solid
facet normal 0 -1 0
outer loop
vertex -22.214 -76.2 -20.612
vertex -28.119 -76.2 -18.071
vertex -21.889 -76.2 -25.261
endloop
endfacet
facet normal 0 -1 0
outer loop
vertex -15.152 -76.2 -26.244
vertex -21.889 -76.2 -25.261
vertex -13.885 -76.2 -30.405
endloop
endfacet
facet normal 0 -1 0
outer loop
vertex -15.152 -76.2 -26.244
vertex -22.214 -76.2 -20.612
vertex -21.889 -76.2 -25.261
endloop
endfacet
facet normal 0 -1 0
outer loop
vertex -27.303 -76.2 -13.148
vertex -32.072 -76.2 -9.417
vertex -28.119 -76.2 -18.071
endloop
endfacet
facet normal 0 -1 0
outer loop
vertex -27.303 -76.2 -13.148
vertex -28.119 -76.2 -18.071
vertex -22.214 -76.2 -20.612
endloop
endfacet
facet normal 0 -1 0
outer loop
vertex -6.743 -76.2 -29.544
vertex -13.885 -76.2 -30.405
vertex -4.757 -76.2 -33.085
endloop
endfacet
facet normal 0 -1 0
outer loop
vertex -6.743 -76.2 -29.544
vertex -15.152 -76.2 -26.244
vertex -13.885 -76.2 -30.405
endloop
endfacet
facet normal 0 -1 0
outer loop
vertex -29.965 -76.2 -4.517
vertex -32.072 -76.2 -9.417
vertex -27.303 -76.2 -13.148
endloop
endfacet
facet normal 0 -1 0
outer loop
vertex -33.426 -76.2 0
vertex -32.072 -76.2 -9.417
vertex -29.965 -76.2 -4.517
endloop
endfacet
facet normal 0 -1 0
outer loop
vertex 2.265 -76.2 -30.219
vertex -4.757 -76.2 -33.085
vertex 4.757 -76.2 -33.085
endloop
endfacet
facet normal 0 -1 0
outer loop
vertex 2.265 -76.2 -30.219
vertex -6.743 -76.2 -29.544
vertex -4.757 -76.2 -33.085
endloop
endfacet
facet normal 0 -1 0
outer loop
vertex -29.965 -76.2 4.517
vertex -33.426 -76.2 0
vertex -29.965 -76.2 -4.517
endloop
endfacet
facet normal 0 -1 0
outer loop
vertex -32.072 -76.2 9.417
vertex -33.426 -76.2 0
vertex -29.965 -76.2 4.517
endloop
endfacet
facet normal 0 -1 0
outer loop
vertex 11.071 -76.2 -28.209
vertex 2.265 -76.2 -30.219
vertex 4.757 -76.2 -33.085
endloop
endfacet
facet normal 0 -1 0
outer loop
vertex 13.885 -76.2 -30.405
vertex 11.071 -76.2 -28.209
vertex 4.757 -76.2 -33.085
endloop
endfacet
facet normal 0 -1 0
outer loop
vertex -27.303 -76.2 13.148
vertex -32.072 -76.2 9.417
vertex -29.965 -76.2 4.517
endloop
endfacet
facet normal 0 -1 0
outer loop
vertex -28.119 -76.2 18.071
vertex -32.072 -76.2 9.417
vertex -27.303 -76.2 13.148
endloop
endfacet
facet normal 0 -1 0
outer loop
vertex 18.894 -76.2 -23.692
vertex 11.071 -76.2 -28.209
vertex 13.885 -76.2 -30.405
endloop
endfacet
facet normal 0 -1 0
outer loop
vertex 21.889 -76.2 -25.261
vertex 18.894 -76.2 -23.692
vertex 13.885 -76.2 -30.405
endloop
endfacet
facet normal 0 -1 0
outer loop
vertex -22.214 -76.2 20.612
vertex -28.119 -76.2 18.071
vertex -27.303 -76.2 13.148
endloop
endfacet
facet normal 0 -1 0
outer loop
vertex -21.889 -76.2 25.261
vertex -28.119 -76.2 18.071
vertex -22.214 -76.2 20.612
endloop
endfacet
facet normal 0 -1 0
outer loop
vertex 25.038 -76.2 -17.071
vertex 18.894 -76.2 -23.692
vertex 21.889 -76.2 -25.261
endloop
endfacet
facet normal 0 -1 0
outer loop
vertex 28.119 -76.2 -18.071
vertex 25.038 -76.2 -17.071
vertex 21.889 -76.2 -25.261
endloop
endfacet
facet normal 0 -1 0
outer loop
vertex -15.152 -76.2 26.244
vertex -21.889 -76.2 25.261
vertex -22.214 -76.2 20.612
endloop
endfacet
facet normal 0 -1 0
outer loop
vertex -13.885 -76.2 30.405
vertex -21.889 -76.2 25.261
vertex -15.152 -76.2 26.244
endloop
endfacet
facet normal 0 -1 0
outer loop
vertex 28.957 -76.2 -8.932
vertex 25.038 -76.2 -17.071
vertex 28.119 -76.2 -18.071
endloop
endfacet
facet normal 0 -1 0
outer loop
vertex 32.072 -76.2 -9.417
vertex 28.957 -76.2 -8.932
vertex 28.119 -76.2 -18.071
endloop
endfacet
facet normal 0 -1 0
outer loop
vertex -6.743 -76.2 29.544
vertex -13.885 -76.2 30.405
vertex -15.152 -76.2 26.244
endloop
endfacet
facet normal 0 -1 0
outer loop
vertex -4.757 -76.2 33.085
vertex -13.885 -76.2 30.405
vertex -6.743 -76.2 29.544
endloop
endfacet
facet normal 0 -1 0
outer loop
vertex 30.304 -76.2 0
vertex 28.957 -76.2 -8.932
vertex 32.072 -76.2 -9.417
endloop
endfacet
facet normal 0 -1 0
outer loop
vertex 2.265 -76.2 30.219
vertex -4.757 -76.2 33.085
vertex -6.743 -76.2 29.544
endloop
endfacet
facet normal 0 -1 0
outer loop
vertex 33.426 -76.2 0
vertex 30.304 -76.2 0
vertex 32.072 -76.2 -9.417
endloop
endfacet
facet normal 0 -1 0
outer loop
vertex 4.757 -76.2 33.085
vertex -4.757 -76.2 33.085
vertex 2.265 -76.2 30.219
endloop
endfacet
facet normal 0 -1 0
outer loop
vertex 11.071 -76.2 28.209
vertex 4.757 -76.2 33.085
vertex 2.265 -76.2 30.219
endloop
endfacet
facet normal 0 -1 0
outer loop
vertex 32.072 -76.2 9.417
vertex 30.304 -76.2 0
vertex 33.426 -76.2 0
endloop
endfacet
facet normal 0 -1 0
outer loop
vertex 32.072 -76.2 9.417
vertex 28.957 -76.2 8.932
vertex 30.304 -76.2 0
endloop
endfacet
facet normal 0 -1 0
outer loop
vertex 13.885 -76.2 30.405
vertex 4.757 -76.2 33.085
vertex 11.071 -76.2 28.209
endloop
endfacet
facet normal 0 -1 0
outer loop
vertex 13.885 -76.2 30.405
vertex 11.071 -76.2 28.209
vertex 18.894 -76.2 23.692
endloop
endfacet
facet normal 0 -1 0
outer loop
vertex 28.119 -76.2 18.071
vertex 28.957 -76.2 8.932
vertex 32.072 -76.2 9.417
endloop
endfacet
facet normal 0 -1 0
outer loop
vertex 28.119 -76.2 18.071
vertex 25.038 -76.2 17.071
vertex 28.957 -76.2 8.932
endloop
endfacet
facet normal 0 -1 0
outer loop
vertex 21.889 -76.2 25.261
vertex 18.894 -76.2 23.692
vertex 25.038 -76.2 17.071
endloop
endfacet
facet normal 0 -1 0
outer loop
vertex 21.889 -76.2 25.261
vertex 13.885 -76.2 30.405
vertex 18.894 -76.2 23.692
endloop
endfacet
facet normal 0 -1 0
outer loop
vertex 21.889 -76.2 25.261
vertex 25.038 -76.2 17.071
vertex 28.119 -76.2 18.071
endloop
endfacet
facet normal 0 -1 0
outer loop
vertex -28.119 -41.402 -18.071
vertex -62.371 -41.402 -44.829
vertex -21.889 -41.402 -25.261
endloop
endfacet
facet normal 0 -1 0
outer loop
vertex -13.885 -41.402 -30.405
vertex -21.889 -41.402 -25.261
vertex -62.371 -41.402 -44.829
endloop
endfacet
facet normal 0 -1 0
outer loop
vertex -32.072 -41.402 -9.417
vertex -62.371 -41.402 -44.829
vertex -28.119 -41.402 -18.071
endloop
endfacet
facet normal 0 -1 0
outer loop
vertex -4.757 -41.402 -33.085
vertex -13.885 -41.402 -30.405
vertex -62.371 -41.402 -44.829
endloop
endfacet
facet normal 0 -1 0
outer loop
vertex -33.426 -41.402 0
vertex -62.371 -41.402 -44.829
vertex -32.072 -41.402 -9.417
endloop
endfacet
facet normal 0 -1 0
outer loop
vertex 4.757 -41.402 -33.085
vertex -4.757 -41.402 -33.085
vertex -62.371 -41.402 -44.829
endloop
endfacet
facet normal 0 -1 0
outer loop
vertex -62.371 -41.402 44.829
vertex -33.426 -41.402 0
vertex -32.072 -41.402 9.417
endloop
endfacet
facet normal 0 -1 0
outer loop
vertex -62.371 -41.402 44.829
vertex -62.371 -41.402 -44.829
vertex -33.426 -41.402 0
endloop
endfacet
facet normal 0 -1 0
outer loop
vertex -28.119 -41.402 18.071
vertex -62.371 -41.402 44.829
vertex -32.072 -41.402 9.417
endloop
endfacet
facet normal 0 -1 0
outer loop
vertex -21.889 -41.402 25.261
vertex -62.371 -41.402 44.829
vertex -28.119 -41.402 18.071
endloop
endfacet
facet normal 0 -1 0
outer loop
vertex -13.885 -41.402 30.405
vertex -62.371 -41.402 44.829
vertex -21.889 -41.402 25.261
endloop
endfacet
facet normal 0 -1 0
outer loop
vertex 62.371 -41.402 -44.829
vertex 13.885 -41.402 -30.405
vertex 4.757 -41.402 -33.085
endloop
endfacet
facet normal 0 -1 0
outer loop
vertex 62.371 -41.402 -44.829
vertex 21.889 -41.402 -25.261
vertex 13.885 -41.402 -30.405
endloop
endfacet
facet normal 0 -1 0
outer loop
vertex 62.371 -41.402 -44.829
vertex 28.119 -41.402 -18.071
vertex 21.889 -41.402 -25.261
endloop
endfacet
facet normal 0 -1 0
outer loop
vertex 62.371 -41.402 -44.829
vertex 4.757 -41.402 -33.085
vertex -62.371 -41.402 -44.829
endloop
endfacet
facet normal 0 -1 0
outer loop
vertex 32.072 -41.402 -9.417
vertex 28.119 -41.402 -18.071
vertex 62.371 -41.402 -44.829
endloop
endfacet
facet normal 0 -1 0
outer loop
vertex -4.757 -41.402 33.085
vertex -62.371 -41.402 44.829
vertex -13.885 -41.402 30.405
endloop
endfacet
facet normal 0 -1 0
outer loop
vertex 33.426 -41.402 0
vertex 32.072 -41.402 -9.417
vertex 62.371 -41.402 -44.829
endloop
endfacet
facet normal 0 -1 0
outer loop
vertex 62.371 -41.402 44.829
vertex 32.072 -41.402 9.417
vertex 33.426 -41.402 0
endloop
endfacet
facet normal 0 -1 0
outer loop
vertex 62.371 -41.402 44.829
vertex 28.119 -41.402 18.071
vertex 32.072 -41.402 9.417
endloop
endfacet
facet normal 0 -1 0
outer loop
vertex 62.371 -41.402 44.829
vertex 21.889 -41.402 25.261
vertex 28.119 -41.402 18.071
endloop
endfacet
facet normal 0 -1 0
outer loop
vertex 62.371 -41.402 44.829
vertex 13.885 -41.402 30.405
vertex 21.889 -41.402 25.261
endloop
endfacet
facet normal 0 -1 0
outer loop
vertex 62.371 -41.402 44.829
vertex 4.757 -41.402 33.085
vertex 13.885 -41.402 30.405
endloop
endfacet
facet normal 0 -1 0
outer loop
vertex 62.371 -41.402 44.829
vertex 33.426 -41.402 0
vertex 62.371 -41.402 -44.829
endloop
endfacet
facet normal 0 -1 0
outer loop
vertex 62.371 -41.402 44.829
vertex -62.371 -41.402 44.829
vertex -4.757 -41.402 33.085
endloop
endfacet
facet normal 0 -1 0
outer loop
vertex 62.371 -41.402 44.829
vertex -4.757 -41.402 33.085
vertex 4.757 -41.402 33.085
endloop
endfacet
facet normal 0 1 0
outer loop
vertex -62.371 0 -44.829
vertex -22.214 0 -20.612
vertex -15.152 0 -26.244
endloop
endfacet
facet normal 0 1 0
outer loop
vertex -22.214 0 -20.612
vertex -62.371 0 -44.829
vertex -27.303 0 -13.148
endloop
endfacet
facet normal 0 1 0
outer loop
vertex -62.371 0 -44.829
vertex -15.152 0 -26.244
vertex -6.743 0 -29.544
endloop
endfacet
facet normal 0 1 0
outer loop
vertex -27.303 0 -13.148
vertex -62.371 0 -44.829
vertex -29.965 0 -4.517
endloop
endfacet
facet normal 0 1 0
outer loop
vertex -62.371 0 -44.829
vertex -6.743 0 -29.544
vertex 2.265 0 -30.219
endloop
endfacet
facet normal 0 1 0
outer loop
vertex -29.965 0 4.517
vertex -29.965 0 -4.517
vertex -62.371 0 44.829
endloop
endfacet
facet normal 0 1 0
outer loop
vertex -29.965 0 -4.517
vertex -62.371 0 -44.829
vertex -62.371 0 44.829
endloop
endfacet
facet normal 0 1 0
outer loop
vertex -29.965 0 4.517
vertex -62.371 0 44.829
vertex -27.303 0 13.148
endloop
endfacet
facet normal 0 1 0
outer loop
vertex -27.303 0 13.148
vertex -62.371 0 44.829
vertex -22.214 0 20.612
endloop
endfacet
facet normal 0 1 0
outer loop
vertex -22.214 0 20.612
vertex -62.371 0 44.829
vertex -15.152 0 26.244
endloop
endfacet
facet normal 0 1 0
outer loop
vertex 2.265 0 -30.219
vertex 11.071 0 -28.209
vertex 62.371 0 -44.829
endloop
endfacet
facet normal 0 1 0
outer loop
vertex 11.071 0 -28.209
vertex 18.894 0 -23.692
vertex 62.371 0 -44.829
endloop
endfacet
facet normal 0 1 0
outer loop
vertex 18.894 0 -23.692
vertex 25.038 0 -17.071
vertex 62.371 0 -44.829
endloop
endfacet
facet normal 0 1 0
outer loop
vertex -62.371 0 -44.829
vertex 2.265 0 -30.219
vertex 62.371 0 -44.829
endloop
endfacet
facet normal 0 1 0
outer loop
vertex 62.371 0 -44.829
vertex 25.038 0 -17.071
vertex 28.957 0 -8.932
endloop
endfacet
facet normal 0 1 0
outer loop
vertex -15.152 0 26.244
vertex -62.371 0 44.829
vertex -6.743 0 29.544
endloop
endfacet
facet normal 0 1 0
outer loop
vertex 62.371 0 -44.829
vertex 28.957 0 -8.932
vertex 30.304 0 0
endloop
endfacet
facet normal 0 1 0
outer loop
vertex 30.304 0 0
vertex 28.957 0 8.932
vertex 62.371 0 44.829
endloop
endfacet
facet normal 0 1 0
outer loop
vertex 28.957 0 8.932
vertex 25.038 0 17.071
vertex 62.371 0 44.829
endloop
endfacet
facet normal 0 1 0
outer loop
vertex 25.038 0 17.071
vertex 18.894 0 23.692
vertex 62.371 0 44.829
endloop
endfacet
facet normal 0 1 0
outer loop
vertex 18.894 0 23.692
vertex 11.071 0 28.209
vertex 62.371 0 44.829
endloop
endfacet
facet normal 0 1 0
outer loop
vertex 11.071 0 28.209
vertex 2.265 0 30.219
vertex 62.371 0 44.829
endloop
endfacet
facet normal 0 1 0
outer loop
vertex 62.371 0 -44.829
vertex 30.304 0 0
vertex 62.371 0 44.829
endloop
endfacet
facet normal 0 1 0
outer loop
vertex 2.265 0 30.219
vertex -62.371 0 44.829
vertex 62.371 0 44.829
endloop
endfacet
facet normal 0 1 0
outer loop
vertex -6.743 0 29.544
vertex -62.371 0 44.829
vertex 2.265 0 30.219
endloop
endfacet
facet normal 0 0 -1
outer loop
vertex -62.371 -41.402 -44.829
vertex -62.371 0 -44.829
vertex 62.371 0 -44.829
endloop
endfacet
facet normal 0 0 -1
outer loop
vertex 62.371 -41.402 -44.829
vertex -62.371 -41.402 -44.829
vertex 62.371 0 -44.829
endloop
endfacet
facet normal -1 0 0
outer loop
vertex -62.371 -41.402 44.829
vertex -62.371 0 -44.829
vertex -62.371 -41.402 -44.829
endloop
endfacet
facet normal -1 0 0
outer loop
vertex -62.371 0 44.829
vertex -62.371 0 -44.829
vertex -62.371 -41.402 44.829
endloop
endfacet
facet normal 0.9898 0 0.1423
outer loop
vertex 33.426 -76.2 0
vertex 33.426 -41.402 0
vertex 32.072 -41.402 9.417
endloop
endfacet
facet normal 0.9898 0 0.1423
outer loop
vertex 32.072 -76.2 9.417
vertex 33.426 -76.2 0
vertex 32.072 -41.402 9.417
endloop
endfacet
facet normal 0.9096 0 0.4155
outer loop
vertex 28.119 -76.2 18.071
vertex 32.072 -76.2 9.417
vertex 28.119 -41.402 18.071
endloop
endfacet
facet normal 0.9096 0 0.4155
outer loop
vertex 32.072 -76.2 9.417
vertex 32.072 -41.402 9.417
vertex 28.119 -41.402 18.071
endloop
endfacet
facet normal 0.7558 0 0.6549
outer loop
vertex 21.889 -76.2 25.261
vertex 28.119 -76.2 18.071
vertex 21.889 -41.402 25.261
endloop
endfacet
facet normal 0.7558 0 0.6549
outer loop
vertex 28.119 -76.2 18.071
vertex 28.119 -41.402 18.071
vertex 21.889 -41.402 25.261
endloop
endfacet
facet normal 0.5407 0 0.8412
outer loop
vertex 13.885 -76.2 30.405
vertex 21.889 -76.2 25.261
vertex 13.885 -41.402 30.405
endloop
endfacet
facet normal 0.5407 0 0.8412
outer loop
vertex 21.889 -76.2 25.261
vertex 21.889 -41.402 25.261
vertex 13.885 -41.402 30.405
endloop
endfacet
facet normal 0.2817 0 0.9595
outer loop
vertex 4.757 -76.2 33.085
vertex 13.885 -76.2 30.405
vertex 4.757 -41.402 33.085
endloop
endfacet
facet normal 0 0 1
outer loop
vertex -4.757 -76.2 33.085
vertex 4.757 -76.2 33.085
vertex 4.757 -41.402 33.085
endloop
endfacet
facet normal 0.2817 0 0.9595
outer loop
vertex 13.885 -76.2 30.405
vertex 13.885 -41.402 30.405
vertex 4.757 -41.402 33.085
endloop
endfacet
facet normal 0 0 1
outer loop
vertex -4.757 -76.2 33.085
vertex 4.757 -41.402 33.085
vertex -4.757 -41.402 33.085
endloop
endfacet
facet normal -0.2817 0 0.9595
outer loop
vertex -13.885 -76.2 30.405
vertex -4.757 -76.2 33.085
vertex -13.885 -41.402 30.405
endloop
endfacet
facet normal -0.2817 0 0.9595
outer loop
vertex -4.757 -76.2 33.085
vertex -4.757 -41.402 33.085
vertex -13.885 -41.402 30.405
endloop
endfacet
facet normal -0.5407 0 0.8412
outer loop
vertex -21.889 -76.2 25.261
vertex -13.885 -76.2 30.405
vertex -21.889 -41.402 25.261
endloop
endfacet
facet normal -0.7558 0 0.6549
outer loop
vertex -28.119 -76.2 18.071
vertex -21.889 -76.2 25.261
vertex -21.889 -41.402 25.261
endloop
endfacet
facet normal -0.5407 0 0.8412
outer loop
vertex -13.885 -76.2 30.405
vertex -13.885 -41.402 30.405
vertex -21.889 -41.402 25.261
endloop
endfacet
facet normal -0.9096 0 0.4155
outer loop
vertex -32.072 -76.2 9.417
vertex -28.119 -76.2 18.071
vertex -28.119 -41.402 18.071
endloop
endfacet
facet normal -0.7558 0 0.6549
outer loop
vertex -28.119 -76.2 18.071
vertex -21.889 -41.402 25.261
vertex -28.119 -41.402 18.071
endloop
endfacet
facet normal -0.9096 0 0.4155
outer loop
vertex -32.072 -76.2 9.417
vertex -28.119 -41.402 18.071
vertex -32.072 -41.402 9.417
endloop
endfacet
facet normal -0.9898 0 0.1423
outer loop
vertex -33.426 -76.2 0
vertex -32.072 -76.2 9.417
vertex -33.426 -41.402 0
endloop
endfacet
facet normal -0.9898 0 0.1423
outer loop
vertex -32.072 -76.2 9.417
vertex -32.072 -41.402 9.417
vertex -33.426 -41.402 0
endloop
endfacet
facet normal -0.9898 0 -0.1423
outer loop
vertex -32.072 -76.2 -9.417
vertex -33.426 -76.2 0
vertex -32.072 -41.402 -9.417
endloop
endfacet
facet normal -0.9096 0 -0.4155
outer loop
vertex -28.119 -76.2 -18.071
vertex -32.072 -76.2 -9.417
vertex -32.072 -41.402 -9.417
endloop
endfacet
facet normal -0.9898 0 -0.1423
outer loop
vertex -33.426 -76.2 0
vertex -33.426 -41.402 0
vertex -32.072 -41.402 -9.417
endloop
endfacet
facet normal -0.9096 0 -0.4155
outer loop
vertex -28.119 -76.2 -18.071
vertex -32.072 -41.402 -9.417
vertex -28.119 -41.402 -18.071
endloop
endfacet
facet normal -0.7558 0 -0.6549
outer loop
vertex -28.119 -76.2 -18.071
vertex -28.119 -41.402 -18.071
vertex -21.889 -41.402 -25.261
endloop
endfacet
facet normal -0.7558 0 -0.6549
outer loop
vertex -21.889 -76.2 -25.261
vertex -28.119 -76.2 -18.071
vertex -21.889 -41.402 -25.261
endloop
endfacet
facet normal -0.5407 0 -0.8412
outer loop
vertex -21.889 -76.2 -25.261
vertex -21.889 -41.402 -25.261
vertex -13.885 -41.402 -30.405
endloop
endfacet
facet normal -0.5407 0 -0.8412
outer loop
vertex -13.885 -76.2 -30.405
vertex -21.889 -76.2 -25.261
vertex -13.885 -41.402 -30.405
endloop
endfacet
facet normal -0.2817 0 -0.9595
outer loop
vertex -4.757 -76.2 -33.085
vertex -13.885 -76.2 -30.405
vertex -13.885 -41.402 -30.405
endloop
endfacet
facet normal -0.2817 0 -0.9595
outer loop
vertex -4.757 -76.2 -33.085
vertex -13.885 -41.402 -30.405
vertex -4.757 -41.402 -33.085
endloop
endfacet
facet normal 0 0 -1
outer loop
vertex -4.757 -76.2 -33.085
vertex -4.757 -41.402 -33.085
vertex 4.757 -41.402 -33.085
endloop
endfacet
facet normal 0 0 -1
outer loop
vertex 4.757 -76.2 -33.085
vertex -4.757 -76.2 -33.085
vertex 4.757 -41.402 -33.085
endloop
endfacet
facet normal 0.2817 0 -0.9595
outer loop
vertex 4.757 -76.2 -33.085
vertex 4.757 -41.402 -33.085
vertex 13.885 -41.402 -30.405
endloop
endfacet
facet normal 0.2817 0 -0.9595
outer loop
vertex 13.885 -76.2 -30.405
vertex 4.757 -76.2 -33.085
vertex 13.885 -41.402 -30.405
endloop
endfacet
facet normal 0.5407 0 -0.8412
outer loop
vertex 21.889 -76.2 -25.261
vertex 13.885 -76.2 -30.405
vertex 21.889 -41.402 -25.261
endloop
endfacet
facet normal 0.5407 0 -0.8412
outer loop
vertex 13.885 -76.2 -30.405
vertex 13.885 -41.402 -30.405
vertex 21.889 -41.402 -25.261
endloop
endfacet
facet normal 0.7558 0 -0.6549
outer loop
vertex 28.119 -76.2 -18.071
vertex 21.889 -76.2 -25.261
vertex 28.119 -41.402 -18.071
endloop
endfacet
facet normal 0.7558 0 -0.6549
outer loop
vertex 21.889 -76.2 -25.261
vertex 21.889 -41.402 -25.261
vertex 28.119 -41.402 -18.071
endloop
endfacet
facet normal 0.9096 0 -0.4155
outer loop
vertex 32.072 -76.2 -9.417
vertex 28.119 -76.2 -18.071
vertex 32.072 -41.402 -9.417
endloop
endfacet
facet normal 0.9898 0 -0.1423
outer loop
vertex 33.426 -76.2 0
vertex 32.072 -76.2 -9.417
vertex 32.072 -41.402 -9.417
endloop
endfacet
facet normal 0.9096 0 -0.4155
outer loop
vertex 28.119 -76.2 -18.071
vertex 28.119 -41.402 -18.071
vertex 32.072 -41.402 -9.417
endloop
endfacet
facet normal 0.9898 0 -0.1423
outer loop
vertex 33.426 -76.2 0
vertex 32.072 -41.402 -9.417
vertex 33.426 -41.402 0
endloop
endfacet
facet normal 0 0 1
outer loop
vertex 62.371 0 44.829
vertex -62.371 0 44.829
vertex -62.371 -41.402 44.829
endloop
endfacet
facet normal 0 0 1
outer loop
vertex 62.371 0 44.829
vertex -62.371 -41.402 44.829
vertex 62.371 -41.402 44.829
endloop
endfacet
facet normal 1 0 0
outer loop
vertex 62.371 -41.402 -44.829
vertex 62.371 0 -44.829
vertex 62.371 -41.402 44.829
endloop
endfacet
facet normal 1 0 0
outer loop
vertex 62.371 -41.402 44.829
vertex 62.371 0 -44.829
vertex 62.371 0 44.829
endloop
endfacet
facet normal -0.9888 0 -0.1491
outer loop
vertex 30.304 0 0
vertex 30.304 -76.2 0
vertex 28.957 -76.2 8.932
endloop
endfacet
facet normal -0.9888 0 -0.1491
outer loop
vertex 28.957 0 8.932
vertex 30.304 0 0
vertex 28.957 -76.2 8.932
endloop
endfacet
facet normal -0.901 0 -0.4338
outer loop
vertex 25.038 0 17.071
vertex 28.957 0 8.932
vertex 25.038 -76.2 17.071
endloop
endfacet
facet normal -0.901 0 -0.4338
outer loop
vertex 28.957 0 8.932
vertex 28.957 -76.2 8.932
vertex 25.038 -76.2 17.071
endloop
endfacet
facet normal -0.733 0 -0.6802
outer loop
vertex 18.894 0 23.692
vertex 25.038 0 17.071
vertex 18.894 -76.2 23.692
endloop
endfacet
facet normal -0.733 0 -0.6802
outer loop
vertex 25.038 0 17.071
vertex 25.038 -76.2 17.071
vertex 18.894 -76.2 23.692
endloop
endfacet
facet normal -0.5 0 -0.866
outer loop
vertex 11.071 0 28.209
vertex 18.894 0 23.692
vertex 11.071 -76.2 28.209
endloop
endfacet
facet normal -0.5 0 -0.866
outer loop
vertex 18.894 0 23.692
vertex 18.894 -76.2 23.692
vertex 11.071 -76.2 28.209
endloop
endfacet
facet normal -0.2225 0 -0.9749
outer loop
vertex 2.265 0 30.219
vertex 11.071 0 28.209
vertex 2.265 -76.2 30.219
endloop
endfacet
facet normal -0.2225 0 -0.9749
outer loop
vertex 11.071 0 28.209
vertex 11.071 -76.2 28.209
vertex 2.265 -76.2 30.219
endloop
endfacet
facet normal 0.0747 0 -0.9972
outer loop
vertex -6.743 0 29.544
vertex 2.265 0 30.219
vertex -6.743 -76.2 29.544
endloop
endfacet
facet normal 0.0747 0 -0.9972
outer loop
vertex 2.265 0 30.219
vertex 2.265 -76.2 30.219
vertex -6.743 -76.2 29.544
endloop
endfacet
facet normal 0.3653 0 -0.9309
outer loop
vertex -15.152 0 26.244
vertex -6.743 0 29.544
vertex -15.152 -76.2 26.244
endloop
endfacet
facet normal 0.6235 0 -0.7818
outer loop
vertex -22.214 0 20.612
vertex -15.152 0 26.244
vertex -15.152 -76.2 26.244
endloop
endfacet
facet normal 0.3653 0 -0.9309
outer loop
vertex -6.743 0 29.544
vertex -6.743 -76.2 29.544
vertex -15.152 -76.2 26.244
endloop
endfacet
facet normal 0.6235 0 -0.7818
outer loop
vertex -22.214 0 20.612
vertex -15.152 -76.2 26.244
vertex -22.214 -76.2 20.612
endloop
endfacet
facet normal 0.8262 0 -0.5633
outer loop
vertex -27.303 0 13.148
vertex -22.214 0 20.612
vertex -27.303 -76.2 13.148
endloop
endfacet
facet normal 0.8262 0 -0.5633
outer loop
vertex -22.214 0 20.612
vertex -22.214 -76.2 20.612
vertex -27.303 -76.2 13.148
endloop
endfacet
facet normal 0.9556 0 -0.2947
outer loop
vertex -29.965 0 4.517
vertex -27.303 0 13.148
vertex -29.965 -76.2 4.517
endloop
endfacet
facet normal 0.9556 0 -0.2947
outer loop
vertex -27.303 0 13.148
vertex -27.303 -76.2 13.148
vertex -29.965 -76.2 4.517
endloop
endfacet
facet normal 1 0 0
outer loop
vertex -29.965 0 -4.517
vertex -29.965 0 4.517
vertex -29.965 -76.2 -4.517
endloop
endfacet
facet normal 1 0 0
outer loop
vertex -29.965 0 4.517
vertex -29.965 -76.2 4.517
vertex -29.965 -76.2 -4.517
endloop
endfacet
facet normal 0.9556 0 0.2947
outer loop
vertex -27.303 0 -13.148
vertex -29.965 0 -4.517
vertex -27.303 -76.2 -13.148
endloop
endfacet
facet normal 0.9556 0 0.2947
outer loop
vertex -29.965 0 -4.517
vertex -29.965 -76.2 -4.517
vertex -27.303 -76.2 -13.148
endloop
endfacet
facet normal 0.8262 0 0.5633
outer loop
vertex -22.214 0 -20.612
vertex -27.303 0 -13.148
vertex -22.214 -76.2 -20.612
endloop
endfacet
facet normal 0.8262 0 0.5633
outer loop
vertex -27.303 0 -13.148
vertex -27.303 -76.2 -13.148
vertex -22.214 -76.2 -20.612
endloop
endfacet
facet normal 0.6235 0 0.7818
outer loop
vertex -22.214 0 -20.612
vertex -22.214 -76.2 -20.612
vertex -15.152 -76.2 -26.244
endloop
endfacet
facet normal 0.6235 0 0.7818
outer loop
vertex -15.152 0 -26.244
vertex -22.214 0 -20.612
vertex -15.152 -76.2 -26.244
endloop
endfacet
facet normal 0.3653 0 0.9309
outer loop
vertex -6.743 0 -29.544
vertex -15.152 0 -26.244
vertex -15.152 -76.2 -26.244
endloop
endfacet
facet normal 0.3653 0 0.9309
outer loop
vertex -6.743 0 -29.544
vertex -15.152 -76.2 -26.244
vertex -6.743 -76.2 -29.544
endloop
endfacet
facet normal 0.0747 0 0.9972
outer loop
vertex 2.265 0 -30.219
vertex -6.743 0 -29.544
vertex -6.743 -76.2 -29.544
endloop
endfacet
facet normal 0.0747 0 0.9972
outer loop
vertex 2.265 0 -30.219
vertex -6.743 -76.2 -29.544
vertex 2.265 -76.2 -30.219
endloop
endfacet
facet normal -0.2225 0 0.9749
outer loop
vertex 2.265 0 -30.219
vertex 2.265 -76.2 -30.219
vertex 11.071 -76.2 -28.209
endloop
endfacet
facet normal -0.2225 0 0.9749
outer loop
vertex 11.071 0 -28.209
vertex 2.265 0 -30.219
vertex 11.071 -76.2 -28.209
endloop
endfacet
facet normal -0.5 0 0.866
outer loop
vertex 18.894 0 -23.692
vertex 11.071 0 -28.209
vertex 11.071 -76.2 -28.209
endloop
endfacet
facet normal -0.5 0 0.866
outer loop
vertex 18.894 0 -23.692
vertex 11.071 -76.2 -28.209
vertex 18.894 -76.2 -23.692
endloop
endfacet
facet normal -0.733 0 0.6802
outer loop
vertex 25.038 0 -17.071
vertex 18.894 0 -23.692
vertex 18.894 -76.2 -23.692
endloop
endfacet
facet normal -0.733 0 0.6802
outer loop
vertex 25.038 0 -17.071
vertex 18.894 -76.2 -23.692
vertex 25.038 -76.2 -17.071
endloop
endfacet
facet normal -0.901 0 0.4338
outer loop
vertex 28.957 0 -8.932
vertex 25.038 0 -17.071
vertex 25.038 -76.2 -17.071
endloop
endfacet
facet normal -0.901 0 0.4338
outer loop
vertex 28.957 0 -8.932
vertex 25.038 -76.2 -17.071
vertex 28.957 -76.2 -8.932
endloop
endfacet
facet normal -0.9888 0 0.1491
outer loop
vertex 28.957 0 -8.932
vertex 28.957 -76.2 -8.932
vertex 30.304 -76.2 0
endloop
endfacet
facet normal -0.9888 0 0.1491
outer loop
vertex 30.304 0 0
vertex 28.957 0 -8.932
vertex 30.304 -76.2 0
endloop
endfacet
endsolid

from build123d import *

# Parameters (mm, degrees)
F0_W     = 124.741532
F0_H     = 89.657984
F1_DEPTH = 41.402
F2_R     = 33.425555
F3_DEPTH = 34.798
F4_R     = 30.303801
F5_DEPTH = 96.266


with BuildPart() as f1:
    # F0 (on Front) → F1 (new body)
    with BuildSketch(Plane.XZ):
        Rectangle(F0_W, F0_H)
    extrude(amount=F1_DEPTH)

    # F2 (on face) → F3 (join)
    with BuildSketch(Plane.XZ.offset(41.402)):
        Circle(F2_R)
    extrude(amount=F3_DEPTH)

    # F4 (on face) → F5 (cut)
    with BuildSketch(Plane.XZ.offset(76.2)):
        Circle(F4_R)
    extrude(amount=-F5_DEPTH, mode=Mode.SUBTRACT)


solid = f1.part
